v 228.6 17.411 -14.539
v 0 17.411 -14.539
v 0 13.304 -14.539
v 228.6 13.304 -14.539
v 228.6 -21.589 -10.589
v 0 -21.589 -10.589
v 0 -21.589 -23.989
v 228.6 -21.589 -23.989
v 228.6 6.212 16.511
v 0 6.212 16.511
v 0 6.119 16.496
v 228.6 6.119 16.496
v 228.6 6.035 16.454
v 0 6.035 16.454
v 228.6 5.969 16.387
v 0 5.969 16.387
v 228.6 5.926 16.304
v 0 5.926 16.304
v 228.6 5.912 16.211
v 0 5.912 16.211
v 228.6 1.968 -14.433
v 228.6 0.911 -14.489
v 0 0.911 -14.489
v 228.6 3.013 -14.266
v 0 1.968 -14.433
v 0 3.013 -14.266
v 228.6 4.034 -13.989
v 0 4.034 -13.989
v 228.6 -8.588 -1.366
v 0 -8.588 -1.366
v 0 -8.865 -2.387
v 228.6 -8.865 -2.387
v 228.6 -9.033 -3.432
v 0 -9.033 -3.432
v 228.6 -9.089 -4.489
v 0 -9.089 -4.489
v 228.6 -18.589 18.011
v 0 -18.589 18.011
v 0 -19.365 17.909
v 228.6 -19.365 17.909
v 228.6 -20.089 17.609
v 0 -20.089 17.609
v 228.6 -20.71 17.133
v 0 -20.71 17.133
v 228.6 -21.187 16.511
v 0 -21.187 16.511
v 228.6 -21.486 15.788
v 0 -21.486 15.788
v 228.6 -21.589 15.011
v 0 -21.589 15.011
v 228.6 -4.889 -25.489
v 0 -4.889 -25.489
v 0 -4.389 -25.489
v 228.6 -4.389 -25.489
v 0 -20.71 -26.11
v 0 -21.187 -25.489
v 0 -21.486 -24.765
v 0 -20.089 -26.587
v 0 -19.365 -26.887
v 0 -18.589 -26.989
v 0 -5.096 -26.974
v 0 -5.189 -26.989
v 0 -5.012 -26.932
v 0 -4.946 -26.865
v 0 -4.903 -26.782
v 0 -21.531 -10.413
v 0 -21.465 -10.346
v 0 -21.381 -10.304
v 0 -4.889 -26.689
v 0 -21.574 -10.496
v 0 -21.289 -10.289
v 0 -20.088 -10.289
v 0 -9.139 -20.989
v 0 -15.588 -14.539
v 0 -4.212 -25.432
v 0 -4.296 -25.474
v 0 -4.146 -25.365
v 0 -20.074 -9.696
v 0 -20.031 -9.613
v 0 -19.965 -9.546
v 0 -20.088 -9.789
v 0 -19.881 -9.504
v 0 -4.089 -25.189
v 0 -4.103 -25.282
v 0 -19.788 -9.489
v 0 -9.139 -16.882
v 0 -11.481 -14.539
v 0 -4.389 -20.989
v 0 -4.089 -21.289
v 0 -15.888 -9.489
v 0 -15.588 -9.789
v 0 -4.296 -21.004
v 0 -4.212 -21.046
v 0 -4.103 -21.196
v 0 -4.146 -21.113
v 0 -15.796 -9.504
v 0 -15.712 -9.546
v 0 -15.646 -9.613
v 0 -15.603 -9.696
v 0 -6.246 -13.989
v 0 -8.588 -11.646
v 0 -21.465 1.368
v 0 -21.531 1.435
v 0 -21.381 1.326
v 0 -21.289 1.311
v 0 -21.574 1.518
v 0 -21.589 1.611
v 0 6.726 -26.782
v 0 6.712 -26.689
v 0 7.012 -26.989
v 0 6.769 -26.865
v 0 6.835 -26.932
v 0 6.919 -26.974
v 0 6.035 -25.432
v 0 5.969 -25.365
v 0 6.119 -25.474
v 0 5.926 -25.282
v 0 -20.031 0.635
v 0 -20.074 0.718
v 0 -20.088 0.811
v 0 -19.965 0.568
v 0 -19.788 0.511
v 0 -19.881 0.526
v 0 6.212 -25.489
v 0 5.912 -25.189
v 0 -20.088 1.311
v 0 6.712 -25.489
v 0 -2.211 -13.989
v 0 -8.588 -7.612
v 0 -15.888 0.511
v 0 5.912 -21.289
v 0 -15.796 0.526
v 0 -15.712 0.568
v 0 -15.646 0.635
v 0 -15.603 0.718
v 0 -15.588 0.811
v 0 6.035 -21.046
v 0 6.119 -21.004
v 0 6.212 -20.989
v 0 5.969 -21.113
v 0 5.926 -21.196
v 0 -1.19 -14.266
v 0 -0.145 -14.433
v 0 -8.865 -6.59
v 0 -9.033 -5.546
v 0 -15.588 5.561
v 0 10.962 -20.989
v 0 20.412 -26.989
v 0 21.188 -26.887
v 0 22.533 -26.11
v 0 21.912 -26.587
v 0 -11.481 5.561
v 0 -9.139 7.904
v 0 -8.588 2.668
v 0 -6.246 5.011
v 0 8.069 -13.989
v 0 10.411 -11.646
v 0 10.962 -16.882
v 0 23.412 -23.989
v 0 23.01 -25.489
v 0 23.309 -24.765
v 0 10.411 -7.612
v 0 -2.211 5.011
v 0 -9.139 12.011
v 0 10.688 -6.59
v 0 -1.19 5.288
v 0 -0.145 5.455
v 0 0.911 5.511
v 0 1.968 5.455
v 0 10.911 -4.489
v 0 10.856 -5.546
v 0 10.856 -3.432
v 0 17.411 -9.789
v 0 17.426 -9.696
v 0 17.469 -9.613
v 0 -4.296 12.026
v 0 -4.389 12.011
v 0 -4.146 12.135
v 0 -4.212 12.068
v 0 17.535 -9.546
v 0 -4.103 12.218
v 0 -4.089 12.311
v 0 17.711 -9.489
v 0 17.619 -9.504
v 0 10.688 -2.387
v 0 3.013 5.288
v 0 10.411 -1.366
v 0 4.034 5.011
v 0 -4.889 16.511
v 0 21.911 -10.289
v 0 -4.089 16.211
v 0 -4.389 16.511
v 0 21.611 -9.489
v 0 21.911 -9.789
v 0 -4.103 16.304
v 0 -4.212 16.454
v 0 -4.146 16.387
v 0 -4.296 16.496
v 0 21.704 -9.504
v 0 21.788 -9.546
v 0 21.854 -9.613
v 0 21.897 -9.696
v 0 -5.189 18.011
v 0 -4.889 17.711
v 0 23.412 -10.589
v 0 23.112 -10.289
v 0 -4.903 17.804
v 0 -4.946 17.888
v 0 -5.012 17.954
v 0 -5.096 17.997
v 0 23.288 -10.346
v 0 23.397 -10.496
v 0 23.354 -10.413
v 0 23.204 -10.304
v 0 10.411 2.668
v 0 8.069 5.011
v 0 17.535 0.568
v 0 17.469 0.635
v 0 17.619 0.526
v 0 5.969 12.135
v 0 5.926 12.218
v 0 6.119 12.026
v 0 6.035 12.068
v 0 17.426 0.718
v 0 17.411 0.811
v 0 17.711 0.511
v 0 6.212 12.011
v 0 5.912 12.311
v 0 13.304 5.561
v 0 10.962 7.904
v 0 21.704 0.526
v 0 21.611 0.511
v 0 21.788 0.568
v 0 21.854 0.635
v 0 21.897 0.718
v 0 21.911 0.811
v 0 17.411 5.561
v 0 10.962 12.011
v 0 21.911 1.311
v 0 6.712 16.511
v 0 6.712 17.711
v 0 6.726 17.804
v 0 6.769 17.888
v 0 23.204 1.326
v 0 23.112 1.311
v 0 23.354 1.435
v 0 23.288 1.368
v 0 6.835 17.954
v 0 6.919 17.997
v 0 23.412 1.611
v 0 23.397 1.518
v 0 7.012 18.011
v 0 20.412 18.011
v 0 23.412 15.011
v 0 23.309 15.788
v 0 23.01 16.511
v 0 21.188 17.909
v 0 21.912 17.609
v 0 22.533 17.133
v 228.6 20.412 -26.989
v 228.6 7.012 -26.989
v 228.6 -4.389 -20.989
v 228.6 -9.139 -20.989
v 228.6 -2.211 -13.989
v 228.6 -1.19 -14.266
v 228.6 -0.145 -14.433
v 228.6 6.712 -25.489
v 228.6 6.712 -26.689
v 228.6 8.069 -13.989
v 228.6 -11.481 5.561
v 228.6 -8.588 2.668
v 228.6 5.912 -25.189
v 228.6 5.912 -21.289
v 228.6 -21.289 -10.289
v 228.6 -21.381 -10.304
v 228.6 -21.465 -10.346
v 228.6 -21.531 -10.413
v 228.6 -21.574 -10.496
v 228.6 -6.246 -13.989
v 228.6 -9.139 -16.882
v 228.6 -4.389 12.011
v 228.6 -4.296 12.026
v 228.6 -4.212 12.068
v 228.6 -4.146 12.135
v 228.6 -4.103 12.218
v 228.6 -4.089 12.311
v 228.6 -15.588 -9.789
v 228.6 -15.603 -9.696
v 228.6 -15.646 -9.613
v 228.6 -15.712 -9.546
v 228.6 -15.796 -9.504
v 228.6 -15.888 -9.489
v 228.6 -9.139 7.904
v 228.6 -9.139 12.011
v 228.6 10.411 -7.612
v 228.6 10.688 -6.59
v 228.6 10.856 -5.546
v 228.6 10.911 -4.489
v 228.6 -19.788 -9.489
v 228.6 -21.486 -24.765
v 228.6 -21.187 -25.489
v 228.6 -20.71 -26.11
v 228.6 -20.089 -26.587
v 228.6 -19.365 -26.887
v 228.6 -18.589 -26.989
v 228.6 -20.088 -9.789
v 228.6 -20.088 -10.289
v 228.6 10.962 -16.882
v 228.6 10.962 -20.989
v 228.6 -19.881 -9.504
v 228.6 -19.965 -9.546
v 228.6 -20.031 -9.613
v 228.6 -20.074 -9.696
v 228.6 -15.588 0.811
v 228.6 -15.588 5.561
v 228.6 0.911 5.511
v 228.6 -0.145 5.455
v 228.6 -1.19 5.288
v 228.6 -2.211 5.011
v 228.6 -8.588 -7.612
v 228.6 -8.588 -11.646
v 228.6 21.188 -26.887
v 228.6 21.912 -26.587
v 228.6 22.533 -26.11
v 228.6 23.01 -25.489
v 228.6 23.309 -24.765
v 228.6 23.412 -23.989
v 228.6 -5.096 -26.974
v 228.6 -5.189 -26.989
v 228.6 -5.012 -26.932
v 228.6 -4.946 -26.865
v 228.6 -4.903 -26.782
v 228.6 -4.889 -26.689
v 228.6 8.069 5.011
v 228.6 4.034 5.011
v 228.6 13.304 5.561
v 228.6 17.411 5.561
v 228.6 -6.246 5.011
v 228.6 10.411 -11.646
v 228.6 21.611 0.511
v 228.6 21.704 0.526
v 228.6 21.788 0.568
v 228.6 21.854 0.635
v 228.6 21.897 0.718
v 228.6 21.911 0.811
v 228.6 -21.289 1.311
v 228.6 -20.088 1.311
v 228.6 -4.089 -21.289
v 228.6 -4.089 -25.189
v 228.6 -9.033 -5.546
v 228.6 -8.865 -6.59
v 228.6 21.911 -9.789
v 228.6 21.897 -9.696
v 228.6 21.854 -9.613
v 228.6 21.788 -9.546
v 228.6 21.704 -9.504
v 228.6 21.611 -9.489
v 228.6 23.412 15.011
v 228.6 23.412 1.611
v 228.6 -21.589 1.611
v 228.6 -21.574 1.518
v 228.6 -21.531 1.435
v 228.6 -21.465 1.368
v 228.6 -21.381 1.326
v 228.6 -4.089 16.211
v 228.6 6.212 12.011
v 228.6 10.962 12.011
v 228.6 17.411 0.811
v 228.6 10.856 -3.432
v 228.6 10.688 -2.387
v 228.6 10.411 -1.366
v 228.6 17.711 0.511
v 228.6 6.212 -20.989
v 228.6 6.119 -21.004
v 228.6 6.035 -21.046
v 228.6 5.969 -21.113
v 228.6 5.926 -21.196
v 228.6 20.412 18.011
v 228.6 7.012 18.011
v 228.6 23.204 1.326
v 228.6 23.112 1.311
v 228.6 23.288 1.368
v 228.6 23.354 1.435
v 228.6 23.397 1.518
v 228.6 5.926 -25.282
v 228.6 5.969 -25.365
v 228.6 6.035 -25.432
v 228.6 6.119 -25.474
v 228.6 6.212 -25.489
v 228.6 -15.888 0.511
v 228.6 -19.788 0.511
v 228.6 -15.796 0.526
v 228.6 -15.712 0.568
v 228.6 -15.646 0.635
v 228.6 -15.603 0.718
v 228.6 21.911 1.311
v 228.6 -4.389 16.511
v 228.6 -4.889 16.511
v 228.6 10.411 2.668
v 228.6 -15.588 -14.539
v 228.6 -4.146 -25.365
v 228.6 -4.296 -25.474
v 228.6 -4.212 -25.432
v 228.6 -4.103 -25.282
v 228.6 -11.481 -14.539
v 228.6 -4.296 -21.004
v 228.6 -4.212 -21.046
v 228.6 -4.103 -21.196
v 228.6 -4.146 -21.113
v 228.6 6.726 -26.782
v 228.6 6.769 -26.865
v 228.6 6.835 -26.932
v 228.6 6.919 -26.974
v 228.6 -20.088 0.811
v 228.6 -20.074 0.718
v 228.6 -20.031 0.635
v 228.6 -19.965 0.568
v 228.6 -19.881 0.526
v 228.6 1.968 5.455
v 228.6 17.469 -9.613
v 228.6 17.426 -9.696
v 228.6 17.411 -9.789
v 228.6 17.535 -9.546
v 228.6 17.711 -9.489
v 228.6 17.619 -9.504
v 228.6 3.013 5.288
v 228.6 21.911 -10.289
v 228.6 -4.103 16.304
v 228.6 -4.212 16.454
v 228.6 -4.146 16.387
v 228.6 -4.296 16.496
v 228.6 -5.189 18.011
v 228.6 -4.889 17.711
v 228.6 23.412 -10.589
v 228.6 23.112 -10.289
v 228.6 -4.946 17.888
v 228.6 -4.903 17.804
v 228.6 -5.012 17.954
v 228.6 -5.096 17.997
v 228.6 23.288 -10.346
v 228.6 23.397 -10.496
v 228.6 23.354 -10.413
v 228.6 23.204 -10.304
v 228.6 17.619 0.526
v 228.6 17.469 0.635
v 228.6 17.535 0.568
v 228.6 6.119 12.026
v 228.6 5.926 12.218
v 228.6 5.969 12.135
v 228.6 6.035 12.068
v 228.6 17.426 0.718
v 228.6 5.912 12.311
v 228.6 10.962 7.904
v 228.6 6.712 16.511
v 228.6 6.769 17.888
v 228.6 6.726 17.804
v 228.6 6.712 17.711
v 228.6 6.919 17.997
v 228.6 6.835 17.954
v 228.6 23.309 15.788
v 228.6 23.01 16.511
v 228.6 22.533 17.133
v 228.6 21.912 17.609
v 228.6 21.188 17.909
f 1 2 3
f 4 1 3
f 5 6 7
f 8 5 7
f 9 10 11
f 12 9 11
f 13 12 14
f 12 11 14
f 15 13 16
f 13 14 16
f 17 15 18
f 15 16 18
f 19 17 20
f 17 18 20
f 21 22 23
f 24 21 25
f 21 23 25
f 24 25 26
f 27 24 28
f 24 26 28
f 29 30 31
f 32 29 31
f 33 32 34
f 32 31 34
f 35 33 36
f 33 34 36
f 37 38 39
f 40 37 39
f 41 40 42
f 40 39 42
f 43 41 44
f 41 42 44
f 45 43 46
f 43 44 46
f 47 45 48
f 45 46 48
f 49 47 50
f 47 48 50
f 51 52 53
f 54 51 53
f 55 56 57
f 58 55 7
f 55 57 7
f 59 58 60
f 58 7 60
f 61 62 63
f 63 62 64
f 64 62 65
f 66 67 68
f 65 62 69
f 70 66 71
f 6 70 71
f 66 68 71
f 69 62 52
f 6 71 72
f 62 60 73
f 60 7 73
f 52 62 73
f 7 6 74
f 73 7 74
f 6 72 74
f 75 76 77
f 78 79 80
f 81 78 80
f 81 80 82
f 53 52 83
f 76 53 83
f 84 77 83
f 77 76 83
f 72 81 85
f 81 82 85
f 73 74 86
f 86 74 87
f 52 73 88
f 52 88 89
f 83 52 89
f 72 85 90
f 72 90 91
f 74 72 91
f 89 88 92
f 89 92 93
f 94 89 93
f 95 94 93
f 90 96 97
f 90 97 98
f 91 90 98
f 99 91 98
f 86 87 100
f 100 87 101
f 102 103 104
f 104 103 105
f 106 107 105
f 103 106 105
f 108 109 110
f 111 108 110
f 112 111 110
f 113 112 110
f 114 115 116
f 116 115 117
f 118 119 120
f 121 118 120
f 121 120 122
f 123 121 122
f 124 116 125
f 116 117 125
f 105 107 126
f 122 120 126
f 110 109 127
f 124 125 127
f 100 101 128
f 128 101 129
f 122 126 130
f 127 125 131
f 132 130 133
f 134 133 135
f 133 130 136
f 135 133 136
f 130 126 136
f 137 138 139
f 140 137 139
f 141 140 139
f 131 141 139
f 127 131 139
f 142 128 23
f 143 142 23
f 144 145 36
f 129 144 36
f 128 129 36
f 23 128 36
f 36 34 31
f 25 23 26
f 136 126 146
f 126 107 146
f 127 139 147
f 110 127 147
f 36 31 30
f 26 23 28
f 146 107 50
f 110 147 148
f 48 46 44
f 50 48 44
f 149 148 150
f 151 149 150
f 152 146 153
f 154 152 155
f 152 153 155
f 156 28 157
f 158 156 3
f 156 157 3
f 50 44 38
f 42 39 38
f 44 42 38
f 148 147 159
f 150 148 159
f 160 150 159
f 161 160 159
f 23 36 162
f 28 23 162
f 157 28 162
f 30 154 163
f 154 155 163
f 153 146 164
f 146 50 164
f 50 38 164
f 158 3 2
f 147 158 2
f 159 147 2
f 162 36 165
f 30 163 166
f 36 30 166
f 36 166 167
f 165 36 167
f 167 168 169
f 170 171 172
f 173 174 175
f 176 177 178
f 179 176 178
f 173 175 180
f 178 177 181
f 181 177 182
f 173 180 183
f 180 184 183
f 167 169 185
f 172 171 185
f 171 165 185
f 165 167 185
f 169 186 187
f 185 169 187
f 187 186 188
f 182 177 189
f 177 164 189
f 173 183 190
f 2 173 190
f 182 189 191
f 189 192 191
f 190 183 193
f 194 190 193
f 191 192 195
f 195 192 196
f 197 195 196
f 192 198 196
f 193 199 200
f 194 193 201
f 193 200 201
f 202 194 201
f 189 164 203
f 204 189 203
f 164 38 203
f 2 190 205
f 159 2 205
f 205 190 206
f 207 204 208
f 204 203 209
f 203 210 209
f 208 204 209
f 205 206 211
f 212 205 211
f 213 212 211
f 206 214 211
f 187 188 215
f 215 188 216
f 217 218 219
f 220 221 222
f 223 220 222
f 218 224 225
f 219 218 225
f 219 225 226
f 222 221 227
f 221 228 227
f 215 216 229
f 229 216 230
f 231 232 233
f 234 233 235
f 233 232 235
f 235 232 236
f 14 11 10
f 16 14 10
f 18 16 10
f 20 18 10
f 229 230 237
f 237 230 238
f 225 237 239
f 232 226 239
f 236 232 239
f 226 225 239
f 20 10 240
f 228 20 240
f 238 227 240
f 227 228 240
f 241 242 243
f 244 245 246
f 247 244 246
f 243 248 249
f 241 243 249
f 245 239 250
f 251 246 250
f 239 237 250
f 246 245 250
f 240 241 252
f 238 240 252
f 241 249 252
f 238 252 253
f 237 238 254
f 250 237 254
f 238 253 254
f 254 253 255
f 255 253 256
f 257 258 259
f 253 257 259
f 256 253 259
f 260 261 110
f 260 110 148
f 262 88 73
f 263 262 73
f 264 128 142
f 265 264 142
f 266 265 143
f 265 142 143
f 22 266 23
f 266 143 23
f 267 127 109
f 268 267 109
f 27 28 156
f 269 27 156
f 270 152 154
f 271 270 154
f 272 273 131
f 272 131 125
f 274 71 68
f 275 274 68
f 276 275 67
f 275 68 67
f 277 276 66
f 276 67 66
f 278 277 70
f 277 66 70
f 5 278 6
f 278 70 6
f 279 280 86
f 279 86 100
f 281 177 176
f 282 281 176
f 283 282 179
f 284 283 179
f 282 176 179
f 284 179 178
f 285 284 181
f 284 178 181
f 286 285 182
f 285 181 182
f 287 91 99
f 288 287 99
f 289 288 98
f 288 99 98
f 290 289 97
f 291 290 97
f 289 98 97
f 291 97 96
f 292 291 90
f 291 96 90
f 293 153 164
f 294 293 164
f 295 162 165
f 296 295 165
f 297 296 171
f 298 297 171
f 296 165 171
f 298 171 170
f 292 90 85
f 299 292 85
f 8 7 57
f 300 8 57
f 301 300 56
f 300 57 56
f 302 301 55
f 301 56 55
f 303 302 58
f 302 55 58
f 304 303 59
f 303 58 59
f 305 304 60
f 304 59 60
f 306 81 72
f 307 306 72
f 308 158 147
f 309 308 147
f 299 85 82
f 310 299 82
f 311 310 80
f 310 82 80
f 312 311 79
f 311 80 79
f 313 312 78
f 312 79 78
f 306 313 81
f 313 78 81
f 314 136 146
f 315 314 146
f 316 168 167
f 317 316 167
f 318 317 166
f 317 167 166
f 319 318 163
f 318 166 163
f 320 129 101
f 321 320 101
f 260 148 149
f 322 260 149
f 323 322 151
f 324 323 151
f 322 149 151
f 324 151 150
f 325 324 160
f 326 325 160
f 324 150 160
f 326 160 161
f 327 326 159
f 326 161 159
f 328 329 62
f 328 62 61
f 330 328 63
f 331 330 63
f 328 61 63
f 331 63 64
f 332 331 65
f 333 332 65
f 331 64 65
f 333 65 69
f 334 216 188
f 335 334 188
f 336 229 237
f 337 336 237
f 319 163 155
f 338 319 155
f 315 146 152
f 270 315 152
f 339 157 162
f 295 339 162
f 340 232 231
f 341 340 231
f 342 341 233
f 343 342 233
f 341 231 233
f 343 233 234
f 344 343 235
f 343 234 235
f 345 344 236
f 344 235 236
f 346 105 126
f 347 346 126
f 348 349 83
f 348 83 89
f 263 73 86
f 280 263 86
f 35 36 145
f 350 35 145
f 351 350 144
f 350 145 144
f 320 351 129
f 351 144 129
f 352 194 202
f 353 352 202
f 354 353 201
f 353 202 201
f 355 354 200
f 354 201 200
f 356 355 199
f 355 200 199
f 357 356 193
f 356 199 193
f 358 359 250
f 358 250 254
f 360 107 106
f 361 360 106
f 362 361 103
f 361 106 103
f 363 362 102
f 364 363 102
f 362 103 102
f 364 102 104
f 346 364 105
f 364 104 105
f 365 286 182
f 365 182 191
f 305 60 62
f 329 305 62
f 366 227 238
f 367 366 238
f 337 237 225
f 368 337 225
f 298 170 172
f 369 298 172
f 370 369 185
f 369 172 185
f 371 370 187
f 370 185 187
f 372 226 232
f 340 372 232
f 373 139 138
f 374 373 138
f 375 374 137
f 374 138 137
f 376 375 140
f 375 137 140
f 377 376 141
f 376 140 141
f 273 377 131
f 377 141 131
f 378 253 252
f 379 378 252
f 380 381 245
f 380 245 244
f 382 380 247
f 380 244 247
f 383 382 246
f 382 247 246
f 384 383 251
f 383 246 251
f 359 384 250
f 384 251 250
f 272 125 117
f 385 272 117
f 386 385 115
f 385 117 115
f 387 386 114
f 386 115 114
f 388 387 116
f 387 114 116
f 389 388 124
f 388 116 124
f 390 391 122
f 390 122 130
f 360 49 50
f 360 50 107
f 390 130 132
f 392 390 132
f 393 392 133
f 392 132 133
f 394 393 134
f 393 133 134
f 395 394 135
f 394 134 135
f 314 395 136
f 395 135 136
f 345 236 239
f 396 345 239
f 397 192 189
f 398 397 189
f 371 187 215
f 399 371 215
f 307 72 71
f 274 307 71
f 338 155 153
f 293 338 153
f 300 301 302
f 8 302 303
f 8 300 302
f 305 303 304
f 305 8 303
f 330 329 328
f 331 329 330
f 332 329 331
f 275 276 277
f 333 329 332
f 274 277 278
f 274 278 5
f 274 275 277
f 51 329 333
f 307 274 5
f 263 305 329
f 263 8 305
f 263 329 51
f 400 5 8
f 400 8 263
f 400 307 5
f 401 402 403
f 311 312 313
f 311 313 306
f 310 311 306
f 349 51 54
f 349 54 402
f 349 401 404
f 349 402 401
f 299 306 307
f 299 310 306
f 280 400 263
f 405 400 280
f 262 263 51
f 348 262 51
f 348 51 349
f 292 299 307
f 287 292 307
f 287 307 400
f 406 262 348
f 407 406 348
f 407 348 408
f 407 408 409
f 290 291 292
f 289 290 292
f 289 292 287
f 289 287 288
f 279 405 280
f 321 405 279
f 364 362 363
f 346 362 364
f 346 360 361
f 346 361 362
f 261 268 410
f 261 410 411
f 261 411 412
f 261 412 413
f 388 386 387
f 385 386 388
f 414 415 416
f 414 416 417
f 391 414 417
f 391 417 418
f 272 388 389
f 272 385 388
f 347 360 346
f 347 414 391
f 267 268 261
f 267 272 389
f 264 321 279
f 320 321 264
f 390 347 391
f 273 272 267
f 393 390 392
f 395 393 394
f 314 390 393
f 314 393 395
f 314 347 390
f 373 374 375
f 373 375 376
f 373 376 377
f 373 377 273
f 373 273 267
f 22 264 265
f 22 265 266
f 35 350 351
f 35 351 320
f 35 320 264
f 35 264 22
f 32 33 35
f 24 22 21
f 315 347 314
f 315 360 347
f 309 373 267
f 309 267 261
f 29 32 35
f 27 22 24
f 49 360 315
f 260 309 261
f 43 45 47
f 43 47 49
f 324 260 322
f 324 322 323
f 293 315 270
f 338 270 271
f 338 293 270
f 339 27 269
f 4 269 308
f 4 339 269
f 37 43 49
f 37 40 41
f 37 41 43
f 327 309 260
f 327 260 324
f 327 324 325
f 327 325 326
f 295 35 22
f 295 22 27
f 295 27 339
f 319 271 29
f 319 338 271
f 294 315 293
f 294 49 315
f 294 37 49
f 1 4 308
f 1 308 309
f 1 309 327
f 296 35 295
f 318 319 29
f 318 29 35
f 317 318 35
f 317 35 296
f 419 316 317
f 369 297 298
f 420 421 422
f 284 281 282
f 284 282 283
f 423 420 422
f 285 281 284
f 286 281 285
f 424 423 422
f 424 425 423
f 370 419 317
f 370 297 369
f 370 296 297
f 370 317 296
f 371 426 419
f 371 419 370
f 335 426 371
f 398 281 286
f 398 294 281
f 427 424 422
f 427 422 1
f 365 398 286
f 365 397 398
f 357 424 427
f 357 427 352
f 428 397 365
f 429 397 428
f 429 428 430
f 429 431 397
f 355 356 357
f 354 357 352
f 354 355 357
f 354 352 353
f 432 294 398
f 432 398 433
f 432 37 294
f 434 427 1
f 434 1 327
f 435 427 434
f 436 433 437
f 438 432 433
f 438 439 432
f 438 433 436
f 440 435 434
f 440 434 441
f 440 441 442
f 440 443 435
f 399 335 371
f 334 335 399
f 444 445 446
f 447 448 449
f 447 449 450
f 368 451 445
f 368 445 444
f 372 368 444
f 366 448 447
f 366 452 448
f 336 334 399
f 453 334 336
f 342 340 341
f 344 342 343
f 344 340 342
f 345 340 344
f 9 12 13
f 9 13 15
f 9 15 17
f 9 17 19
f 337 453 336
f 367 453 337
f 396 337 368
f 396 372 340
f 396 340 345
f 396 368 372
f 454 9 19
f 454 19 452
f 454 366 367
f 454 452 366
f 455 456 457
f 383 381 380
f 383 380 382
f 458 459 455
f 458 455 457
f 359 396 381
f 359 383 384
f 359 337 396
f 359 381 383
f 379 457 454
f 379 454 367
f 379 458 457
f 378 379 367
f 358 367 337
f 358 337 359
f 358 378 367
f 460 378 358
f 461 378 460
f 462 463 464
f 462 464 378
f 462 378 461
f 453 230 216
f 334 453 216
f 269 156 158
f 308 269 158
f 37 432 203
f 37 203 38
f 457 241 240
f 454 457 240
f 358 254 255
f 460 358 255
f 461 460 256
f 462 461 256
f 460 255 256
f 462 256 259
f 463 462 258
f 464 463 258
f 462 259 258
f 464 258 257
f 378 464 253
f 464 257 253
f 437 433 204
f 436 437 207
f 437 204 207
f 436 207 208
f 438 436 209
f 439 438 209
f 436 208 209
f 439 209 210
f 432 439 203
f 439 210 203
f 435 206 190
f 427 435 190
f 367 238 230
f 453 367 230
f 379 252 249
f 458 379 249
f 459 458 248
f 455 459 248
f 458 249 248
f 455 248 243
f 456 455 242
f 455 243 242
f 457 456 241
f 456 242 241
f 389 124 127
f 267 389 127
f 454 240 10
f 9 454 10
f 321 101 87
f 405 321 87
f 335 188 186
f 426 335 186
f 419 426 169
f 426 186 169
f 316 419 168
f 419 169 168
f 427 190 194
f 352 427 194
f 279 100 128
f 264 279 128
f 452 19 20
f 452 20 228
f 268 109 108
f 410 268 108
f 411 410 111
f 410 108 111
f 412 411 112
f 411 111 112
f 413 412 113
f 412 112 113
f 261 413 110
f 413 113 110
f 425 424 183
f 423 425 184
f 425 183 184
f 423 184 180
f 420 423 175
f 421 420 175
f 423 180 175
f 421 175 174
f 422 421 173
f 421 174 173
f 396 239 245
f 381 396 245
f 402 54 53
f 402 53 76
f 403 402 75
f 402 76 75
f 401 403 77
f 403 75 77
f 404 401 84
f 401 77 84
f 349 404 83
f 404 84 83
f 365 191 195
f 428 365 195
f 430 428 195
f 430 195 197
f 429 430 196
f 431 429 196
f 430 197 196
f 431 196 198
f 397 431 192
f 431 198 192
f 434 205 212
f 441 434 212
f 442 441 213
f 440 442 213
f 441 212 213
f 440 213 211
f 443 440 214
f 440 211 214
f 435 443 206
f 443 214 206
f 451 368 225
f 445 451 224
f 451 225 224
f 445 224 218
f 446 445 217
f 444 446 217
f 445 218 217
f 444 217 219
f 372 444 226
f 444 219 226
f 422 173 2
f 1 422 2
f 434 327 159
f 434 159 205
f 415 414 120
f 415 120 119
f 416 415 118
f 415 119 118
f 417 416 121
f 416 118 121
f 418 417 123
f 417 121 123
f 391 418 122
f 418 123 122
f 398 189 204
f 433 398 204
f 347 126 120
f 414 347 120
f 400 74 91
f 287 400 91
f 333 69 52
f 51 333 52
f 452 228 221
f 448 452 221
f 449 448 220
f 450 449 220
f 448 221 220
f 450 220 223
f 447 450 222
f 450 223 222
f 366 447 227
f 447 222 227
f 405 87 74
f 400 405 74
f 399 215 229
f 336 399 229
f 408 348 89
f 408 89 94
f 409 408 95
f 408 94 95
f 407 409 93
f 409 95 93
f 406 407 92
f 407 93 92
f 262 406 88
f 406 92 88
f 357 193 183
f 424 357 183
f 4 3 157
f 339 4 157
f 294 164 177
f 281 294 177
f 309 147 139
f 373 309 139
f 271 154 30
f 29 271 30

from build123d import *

# Parameters (mm, degrees)
F1_DEPTH = 228.6


with BuildPart() as f1:
    # F0 (on Right) → F1 (new body)
    with BuildSketch(Plane.YZ):
        with BuildLine():
            Line((-20.088481, -9.788837), (-20.088481, -10.288837))
            Line((-20.088481, -10.288837), (-21.28859, -10.288837))
            ThreePointArc((-21.28859, -10.288837), (-21.500722, -10.376705), (-21.58859, -10.588837))
            Line((-21.58859, -10.588837), (-21.58859, -23.988949))
            ThreePointArc((-21.58859, -23.988949), (-20.70991, -26.11027), (-18.58859, -26.988949))
            Line((-18.58859, -26.988949), (-5.188544, -26.988949))
            ThreePointArc((-5.188544, -26.988949), (-4.976411, -26.901081), (-4.888544, -26.688949))
            Line((-4.888544, -26.688949), (-4.888544, -25.488841))
            Line((-4.888544, -25.488841), (-4.388544, -25.488841))
            ThreePointArc((-4.388544, -25.488841), (-4.176411, -25.400973), (-4.088544, -25.188841))
            Line((-4.088544, -25.188841), (-4.088544, -21.288841))
            ThreePointArc((-4.088544, -21.288841), (-4.176411, -21.076709), (-4.388544, -20.988841))
            Line((-4.388544, -20.988841), (-9.138663, -20.988841))
            Line((-9.138663, -20.988841), (-9.138663, -16.881665))
            Line((-9.138663, -16.881665), (-6.245729, -13.988731))
            Line((-6.245729, -13.988731), (-2.211433, -13.988731))
            ThreePointArc((-2.211433, -13.988731), (-0.669869, -14.363044), (0.91149, -14.48887))
            Line((0.91149, -14.48887), (0.91149, -4.48887))
            Line((0.91149, -4.48887), (-9.08851, -4.48887))
            ThreePointArc((-9.08851, -4.48887), (-8.962684, -6.070229), (-8.588371, -7.611793))
            Line((-8.588371, -7.611793), (-8.588371, -11.646022))
            Line((-8.588371, -11.646022), (-11.481305, -14.538956))
            Line((-11.481305, -14.538956), (-15.588481, -14.538956))
            Line((-15.588481, -14.538956), (-15.588481, -9.788837))
            ThreePointArc((-15.588481, -9.788837), (-15.676349, -9.576705), (-15.888481, -9.488837))
            Line((-15.888481, -9.488837), (-19.788481, -9.488837))
            ThreePointArc((-19.788481, -9.488837), (-20.000613, -9.576705), (-20.088481, -9.788837))
        make_face()
        with BuildLine():
            ThreePointArc((-8.588371, -1.365947), (-8.962684, -2.907511), (-9.08851, -4.48887))
            Line((-9.08851, -4.48887), (0.91149, -4.48887))
            Line((0.91149, -4.48887), (0.91149, 5.51113))
            ThreePointArc((0.91149, 5.51113), (-0.669869, 5.385303), (-2.211433, 5.010991))
            Line((-2.211433, 5.010991), (-6.245729, 5.010991))
            Line((-6.245729, 5.010991), (-9.138663, 7.903925))
            Line((-9.138663, 7.903925), (-9.138663, 12.011101))
            Line((-9.138663, 12.011101), (-4.388544, 12.011101))
            ThreePointArc((-4.388544, 12.011101), (-4.176411, 12.098969), (-4.088544, 12.311101))
            Line((-4.088544, 12.311101), (-4.088544, 16.211101))
            ThreePointArc((-4.088544, 16.211101), (-4.176411, 16.423233), (-4.388544, 16.511101))
            Line((-4.388544, 16.511101), (-4.888544, 16.511101))
            Line((-4.888544, 16.511101), (-4.888544, 17.711209))
            ThreePointArc((-4.888544, 17.711209), (-4.976411, 17.923341), (-5.188544, 18.011209))
            Line((-5.188544, 18.011209), (-18.58859, 18.011209))
            ThreePointArc((-18.58859, 18.011209), (-20.70991, 17.13253), (-21.58859, 15.011209))
            Line((-21.58859, 15.011209), (-21.58859, 1.611097))
            ThreePointArc((-21.58859, 1.611097), (-21.500722, 1.398965), (-21.28859, 1.311097))
            Line((-21.28859, 1.311097), (-20.088481, 1.311097))
            Line((-20.088481, 1.311097), (-20.088481, 0.811097))
            ThreePointArc((-20.088481, 0.811097), (-20.000613, 0.598965), (-19.788481, 0.511097))
            Line((-19.788481, 0.511097), (-15.888481, 0.511097))
            ThreePointArc((-15.888481, 0.511097), (-15.676349, 0.598965), (-15.588481, 0.811097))
            Line((-15.588481, 0.811097), (-15.588481, 5.561216))
            Line((-15.588481, 5.561216), (-11.481305, 5.561216))
            Line((-11.481305, 5.561216), (-8.588371, 2.668282))
            Line((-8.588371, 2.668282), (-8.588371, -1.365947))
        make_face()
        with BuildLine():
            Line((0.91149, 5.51113), (0.91149, -4.48887))
            Line((0.91149, -4.48887), (10.91149, -4.48887))
            ThreePointArc((10.91149, -4.48887), (10.785663, -2.907511), (10.41135, -1.365947))
            Line((10.41135, -1.365947), (10.41135, 2.668282))
            Line((10.41135, 2.668282), (13.304285, 5.561216))
            Line((13.304285, 5.561216), (14.016842, 5.561216))
            Line((14.016842, 5.561216), (17.41146, 5.561216))
            Line((17.41146, 5.561216), (17.41146, 0.811097))
            ThreePointArc((17.41146, 0.811097), (17.499328, 0.598965), (17.71146, 0.511097))
            Line((17.71146, 0.511097), (21.61146, 0.511097))
            ThreePointArc((21.61146, 0.511097), (21.823593, 0.598965), (21.91146, 0.811097))
            Line((21.91146, 0.811097), (21.91146, 1.311097))
            Line((21.91146, 1.311097), (23.111569, 1.311097))
            ThreePointArc((23.111569, 1.311097), (23.323701, 1.398965), (23.411569, 1.611097))
            Line((23.411569, 1.611097), (23.411569, 15.011209))
            ThreePointArc((23.411569, 15.011209), (22.532889, 17.13253), (20.411569, 18.011209))
            Line((20.411569, 18.011209), (7.011523, 18.011209))
            ThreePointArc((7.011523, 18.011209), (6.799391, 17.923341), (6.711523, 17.711209))
            Line((6.711523, 17.711209), (6.711523, 16.511101))
            Line((6.711523, 16.511101), (6.211523, 16.511101))
            ThreePointArc((6.211523, 16.511101), (5.999391, 16.423233), (5.911523, 16.211101))
            Line((5.911523, 16.211101), (5.911523, 12.311101))
            ThreePointArc((5.911523, 12.311101), (5.999391, 12.098969), (6.211523, 12.011101))
            Line((6.211523, 12.011101), (10.961642, 12.011101))
            Line((10.961642, 12.011101), (10.961642, 7.903925))
            Line((10.961642, 7.903925), (8.068708, 5.010991))
            Line((8.068708, 5.010991), (4.034413, 5.010991))
            ThreePointArc((4.034413, 5.010991), (2.492849, 5.385303), (0.91149, 5.51113))
        make_face()
        with BuildLine():
            Line((10.91149, -4.48887), (0.91149, -4.48887))
            Line((0.91149, -4.48887), (0.91149, -14.48887))
            ThreePointArc((0.91149, -14.48887), (2.492849, -14.363044), (4.034413, -13.988731))
            Line((4.034413, -13.988731), (8.068708, -13.988731))
            Line((8.068708, -13.988731), (10.961642, -16.881665))
            Line((10.961642, -16.881665), (10.961642, -20.988841))
            Line((10.961642, -20.988841), (6.211523, -20.988841))
            ThreePointArc((6.211523, -20.988841), (5.999391, -21.076709), (5.911523, -21.288841))
            Line((5.911523, -21.288841), (5.911523, -25.188841))
            ThreePointArc((5.911523, -25.188841), (5.999391, -25.400973), (6.211523, -25.488841))
            Line((6.211523, -25.488841), (6.711523, -25.488841))
            Line((6.711523, -25.488841), (6.711523, -26.688949))
            ThreePointArc((6.711523, -26.688949), (6.799391, -26.901081), (7.011523, -26.988949))
            Line((7.011523, -26.988949), (20.411569, -26.988949))
            ThreePointArc((20.411569, -26.988949), (22.532889, -26.11027), (23.411569, -23.988949))
            Line((23.411569, -23.988949), (23.411569, -10.588837))
            ThreePointArc((23.411569, -10.588837), (23.323701, -10.376705), (23.111569, -10.288837))
            Line((23.111569, -10.288837), (21.91146, -10.288837))
            Line((21.91146, -10.288837), (21.91146, -9.788837))
            ThreePointArc((21.91146, -9.788837), (21.823593, -9.576705), (21.61146, -9.488837))
            Line((21.61146, -9.488837), (17.71146, -9.488837))
            ThreePointArc((17.71146, -9.488837), (17.499328, -9.576705), (17.41146, -9.788837))
            Line((17.41146, -9.788837), (17.41146, -14.538956))
            Line((17.41146, -14.538956), (13.304285, -14.538956))
            Line((13.304285, -14.538956), (10.41135, -11.646022))
            Line((10.41135, -11.646022), (10.41135, -7.611793))
            ThreePointArc((10.41135, -7.611793), (10.785663, -6.070229), (10.91149, -4.48887))
        make_face()
    extrude(amount=F1_DEPTH)


solid = f1.part
